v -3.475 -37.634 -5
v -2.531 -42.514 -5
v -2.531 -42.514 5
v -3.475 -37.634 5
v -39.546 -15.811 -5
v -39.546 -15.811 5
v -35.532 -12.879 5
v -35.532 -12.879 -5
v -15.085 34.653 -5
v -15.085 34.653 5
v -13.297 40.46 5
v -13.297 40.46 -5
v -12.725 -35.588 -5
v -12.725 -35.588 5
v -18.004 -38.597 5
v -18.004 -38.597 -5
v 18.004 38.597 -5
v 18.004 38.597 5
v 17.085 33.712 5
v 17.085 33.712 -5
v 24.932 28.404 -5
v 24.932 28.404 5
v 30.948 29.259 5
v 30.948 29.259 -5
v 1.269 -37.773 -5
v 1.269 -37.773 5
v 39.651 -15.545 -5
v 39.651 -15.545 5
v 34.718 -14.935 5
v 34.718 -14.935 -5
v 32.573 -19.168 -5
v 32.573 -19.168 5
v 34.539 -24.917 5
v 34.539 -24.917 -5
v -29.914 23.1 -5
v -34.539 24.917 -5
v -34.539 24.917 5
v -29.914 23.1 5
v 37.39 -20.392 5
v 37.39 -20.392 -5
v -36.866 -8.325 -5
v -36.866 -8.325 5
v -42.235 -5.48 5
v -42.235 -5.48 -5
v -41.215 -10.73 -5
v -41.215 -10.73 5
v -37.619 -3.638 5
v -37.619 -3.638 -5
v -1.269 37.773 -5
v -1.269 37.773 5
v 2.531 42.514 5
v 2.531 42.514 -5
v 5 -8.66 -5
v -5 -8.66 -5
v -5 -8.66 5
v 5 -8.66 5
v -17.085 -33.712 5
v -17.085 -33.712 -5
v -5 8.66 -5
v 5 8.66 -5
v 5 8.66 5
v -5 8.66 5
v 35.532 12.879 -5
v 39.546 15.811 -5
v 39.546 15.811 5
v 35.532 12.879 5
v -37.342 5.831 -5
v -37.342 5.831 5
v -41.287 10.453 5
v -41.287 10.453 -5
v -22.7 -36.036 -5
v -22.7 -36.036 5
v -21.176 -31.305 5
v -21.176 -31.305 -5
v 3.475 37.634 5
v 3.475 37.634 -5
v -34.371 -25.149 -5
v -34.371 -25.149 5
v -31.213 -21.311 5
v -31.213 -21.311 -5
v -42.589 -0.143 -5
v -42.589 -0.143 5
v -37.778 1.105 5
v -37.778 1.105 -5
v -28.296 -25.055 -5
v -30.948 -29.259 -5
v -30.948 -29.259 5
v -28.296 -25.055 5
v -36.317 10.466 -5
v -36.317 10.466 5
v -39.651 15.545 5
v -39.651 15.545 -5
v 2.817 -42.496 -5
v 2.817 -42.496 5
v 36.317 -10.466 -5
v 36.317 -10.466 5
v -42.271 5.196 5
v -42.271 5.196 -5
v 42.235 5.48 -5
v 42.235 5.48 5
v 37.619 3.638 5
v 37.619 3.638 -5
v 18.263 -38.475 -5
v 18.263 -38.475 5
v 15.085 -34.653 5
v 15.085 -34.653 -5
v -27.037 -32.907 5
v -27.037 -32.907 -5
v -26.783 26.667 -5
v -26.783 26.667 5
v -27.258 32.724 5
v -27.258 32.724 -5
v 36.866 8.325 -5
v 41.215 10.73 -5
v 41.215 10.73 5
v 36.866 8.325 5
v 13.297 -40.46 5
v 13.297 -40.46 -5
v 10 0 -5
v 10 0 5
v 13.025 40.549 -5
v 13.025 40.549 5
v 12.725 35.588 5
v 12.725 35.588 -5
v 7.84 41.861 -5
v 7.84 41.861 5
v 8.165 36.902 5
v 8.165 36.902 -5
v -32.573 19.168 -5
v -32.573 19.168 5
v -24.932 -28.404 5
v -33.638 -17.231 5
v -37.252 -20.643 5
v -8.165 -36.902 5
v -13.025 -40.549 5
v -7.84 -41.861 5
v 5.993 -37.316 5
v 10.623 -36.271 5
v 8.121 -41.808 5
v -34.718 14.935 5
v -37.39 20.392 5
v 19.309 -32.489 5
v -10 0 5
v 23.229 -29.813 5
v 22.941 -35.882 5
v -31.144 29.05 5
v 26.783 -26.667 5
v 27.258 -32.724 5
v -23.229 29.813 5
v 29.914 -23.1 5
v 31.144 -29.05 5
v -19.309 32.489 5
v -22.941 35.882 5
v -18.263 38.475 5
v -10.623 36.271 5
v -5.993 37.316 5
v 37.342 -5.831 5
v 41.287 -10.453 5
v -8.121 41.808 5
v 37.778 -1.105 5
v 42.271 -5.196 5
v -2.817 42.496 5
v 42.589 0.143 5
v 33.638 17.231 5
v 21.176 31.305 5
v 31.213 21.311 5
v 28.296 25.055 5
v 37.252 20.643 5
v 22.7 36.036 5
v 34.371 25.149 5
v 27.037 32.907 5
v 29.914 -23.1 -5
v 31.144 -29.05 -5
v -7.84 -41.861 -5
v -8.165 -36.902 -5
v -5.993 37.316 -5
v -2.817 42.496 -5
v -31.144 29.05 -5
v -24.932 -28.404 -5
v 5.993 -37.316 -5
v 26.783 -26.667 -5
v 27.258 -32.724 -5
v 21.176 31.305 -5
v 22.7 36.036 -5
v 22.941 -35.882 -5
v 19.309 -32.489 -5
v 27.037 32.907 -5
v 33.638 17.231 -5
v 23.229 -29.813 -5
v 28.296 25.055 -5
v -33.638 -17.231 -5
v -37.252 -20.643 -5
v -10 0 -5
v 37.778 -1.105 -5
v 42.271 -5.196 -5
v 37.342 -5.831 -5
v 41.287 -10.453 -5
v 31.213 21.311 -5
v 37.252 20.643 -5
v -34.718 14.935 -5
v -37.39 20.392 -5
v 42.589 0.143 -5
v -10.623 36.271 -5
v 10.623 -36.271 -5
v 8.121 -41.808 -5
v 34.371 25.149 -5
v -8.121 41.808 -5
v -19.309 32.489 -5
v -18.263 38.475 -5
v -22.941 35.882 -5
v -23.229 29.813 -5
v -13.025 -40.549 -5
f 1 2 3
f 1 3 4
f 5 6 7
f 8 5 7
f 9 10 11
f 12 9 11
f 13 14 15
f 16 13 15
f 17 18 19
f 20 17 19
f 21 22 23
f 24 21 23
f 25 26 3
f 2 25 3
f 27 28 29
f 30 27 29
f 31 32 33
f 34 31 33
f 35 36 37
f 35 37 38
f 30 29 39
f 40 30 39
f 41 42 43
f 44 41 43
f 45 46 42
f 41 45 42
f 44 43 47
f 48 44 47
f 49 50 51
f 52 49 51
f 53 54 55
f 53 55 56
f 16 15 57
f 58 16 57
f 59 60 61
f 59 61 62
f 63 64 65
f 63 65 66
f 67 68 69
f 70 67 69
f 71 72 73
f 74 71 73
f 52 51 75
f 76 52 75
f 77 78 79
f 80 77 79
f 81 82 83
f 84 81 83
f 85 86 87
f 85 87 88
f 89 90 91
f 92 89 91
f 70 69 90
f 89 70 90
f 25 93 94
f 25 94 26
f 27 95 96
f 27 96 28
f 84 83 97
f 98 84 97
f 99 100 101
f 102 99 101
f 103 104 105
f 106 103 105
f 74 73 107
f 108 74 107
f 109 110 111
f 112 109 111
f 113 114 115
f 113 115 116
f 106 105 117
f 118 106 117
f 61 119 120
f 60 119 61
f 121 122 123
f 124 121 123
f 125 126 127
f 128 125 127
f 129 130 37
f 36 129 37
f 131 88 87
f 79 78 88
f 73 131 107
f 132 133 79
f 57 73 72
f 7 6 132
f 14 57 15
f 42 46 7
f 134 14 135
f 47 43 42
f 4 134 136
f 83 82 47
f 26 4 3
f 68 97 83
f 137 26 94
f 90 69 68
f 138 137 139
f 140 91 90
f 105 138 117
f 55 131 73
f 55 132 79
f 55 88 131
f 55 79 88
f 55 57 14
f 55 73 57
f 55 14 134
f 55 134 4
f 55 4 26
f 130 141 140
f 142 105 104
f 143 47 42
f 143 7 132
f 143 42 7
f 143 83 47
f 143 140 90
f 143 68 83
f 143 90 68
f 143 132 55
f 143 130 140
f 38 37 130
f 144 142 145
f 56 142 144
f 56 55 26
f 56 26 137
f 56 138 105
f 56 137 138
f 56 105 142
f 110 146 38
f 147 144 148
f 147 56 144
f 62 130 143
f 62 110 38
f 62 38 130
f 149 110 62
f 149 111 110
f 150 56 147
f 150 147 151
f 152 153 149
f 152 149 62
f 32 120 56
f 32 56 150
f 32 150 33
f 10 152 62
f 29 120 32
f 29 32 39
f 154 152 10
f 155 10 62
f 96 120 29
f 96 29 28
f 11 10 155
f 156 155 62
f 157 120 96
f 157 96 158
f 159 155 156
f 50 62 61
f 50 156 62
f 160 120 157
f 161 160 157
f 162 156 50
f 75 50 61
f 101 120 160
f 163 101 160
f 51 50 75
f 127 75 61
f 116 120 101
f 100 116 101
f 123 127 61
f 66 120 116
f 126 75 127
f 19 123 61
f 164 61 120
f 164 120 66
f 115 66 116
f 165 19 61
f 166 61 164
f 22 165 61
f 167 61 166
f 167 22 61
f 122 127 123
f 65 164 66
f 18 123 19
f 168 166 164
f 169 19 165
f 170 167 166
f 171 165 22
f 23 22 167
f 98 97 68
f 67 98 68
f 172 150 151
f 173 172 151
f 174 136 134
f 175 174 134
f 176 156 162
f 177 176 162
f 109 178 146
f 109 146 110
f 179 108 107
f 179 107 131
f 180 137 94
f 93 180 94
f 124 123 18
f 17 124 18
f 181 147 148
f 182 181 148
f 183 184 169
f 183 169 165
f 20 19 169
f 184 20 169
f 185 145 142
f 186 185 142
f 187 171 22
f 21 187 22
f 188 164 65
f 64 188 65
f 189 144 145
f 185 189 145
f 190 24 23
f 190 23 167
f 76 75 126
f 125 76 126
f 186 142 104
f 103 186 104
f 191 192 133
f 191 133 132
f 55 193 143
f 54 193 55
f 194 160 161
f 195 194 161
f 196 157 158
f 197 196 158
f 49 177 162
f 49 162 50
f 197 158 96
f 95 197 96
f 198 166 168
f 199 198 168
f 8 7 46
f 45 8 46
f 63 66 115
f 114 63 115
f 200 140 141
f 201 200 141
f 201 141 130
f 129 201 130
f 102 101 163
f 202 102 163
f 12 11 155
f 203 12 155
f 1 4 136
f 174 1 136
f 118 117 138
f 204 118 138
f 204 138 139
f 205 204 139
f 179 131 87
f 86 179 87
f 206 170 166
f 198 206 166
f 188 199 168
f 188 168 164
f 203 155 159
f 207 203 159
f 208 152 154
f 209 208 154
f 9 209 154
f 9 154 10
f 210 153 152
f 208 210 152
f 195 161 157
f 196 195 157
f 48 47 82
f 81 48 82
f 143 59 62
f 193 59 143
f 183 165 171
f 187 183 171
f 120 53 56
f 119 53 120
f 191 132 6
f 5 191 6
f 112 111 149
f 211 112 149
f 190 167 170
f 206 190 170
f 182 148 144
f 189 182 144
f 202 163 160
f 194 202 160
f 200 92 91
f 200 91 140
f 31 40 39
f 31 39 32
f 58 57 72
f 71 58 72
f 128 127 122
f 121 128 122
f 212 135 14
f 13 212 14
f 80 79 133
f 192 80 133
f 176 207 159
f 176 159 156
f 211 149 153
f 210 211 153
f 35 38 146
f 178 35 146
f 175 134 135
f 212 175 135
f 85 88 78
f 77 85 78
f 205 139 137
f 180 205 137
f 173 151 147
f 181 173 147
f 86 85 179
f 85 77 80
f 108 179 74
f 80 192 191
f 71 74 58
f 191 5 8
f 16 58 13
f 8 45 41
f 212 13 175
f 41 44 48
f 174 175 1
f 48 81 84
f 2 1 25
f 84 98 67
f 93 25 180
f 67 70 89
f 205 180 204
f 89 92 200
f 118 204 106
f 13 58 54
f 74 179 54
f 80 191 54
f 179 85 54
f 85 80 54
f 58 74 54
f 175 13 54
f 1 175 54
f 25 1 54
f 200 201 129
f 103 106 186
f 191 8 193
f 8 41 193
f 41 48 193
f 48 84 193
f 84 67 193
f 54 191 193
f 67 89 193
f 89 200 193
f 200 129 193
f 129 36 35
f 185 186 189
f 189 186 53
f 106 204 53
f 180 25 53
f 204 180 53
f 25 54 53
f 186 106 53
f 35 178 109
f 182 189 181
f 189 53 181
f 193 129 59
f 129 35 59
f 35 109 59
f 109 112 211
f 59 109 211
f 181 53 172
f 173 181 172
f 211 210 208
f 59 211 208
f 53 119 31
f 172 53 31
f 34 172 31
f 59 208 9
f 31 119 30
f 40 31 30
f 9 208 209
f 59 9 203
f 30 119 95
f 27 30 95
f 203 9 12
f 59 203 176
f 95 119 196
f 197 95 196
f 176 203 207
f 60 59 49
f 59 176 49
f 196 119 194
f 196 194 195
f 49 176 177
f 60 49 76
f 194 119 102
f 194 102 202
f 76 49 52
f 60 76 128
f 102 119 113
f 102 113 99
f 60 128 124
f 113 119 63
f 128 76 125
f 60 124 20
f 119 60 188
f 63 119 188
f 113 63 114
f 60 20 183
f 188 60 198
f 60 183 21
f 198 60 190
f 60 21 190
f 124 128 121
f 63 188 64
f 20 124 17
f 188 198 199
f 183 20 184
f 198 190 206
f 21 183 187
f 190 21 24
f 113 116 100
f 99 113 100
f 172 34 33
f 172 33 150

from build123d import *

# Parameters (mm, degrees)
SCHIZZO1_R                    = 42.70134189
ESTRUSIONE_ESTRUSIONE2_DEPTH  = 5
TAGLIO_ESTRUSIONE4_DEPTH      = 62.21118524
TAGLIO_ESTRUSIONE4_DEPTH_BACK = 62.21118524
TAGLIO_ESTRUSIONE5_DEPTH      = 62.21118524
RIPETIZIONECIRCOLARE1_COUNT   = 50


with BuildPart() as part:
    # Schizzo1 → Estrusione-Estrusione2 (new, symmetric)
    with BuildSketch(Plane.XY):
        Circle(SCHIZZO1_R)
    extrude(amount=ESTRUSIONE_ESTRUSIONE2_DEPTH, both=True)

    # Schizzo6 → Taglio-Estrusione4 (cut, two sides: drawn at the far end of the back side and taken through both)
    with BuildSketch(Plane.XY.offset(5).offset(-TAGLIO_ESTRUSIONE4_DEPTH_BACK)):
        Polygon((10, 0), (5, 8.660254038), (-5, 8.660254038), (-10, 0), (-5, -8.660254038), (5, -8.660254038), align=None)
    extrude(amount=TAGLIO_ESTRUSIONE4_DEPTH + TAGLIO_ESTRUSIONE4_DEPTH_BACK, mode=Mode.SUBTRACT)

    # Schizzo7 → Taglio-Estrusione5 (cut, through all)
    with BuildSketch(Plane.XY.offset(5)):
        Polygon((-9.417976615, 44.546082505), (-5.993285857, 37.316179794), (-1.087643203, 45.316179794), align=None)
    taglio_estrusione5 = extrude(amount=-TAGLIO_ESTRUSIONE5_DEPTH, mode=Mode.SUBTRACT)

    # RipetizioneCircolare1: Taglio-Estrusione5 ×50 about axis
    ripetizionecircolare1_axis = Axis((0, 0, 0), (0, 0, 1))
    for i in range(1, RIPETIZIONECIRCOLARE1_COUNT):
        add(taglio_estrusione5.rotate(ripetizionecircolare1_axis, i * 360 / RIPETIZIONECIRCOLARE1_COUNT), mode=Mode.SUBTRACT)


solid = part.part
